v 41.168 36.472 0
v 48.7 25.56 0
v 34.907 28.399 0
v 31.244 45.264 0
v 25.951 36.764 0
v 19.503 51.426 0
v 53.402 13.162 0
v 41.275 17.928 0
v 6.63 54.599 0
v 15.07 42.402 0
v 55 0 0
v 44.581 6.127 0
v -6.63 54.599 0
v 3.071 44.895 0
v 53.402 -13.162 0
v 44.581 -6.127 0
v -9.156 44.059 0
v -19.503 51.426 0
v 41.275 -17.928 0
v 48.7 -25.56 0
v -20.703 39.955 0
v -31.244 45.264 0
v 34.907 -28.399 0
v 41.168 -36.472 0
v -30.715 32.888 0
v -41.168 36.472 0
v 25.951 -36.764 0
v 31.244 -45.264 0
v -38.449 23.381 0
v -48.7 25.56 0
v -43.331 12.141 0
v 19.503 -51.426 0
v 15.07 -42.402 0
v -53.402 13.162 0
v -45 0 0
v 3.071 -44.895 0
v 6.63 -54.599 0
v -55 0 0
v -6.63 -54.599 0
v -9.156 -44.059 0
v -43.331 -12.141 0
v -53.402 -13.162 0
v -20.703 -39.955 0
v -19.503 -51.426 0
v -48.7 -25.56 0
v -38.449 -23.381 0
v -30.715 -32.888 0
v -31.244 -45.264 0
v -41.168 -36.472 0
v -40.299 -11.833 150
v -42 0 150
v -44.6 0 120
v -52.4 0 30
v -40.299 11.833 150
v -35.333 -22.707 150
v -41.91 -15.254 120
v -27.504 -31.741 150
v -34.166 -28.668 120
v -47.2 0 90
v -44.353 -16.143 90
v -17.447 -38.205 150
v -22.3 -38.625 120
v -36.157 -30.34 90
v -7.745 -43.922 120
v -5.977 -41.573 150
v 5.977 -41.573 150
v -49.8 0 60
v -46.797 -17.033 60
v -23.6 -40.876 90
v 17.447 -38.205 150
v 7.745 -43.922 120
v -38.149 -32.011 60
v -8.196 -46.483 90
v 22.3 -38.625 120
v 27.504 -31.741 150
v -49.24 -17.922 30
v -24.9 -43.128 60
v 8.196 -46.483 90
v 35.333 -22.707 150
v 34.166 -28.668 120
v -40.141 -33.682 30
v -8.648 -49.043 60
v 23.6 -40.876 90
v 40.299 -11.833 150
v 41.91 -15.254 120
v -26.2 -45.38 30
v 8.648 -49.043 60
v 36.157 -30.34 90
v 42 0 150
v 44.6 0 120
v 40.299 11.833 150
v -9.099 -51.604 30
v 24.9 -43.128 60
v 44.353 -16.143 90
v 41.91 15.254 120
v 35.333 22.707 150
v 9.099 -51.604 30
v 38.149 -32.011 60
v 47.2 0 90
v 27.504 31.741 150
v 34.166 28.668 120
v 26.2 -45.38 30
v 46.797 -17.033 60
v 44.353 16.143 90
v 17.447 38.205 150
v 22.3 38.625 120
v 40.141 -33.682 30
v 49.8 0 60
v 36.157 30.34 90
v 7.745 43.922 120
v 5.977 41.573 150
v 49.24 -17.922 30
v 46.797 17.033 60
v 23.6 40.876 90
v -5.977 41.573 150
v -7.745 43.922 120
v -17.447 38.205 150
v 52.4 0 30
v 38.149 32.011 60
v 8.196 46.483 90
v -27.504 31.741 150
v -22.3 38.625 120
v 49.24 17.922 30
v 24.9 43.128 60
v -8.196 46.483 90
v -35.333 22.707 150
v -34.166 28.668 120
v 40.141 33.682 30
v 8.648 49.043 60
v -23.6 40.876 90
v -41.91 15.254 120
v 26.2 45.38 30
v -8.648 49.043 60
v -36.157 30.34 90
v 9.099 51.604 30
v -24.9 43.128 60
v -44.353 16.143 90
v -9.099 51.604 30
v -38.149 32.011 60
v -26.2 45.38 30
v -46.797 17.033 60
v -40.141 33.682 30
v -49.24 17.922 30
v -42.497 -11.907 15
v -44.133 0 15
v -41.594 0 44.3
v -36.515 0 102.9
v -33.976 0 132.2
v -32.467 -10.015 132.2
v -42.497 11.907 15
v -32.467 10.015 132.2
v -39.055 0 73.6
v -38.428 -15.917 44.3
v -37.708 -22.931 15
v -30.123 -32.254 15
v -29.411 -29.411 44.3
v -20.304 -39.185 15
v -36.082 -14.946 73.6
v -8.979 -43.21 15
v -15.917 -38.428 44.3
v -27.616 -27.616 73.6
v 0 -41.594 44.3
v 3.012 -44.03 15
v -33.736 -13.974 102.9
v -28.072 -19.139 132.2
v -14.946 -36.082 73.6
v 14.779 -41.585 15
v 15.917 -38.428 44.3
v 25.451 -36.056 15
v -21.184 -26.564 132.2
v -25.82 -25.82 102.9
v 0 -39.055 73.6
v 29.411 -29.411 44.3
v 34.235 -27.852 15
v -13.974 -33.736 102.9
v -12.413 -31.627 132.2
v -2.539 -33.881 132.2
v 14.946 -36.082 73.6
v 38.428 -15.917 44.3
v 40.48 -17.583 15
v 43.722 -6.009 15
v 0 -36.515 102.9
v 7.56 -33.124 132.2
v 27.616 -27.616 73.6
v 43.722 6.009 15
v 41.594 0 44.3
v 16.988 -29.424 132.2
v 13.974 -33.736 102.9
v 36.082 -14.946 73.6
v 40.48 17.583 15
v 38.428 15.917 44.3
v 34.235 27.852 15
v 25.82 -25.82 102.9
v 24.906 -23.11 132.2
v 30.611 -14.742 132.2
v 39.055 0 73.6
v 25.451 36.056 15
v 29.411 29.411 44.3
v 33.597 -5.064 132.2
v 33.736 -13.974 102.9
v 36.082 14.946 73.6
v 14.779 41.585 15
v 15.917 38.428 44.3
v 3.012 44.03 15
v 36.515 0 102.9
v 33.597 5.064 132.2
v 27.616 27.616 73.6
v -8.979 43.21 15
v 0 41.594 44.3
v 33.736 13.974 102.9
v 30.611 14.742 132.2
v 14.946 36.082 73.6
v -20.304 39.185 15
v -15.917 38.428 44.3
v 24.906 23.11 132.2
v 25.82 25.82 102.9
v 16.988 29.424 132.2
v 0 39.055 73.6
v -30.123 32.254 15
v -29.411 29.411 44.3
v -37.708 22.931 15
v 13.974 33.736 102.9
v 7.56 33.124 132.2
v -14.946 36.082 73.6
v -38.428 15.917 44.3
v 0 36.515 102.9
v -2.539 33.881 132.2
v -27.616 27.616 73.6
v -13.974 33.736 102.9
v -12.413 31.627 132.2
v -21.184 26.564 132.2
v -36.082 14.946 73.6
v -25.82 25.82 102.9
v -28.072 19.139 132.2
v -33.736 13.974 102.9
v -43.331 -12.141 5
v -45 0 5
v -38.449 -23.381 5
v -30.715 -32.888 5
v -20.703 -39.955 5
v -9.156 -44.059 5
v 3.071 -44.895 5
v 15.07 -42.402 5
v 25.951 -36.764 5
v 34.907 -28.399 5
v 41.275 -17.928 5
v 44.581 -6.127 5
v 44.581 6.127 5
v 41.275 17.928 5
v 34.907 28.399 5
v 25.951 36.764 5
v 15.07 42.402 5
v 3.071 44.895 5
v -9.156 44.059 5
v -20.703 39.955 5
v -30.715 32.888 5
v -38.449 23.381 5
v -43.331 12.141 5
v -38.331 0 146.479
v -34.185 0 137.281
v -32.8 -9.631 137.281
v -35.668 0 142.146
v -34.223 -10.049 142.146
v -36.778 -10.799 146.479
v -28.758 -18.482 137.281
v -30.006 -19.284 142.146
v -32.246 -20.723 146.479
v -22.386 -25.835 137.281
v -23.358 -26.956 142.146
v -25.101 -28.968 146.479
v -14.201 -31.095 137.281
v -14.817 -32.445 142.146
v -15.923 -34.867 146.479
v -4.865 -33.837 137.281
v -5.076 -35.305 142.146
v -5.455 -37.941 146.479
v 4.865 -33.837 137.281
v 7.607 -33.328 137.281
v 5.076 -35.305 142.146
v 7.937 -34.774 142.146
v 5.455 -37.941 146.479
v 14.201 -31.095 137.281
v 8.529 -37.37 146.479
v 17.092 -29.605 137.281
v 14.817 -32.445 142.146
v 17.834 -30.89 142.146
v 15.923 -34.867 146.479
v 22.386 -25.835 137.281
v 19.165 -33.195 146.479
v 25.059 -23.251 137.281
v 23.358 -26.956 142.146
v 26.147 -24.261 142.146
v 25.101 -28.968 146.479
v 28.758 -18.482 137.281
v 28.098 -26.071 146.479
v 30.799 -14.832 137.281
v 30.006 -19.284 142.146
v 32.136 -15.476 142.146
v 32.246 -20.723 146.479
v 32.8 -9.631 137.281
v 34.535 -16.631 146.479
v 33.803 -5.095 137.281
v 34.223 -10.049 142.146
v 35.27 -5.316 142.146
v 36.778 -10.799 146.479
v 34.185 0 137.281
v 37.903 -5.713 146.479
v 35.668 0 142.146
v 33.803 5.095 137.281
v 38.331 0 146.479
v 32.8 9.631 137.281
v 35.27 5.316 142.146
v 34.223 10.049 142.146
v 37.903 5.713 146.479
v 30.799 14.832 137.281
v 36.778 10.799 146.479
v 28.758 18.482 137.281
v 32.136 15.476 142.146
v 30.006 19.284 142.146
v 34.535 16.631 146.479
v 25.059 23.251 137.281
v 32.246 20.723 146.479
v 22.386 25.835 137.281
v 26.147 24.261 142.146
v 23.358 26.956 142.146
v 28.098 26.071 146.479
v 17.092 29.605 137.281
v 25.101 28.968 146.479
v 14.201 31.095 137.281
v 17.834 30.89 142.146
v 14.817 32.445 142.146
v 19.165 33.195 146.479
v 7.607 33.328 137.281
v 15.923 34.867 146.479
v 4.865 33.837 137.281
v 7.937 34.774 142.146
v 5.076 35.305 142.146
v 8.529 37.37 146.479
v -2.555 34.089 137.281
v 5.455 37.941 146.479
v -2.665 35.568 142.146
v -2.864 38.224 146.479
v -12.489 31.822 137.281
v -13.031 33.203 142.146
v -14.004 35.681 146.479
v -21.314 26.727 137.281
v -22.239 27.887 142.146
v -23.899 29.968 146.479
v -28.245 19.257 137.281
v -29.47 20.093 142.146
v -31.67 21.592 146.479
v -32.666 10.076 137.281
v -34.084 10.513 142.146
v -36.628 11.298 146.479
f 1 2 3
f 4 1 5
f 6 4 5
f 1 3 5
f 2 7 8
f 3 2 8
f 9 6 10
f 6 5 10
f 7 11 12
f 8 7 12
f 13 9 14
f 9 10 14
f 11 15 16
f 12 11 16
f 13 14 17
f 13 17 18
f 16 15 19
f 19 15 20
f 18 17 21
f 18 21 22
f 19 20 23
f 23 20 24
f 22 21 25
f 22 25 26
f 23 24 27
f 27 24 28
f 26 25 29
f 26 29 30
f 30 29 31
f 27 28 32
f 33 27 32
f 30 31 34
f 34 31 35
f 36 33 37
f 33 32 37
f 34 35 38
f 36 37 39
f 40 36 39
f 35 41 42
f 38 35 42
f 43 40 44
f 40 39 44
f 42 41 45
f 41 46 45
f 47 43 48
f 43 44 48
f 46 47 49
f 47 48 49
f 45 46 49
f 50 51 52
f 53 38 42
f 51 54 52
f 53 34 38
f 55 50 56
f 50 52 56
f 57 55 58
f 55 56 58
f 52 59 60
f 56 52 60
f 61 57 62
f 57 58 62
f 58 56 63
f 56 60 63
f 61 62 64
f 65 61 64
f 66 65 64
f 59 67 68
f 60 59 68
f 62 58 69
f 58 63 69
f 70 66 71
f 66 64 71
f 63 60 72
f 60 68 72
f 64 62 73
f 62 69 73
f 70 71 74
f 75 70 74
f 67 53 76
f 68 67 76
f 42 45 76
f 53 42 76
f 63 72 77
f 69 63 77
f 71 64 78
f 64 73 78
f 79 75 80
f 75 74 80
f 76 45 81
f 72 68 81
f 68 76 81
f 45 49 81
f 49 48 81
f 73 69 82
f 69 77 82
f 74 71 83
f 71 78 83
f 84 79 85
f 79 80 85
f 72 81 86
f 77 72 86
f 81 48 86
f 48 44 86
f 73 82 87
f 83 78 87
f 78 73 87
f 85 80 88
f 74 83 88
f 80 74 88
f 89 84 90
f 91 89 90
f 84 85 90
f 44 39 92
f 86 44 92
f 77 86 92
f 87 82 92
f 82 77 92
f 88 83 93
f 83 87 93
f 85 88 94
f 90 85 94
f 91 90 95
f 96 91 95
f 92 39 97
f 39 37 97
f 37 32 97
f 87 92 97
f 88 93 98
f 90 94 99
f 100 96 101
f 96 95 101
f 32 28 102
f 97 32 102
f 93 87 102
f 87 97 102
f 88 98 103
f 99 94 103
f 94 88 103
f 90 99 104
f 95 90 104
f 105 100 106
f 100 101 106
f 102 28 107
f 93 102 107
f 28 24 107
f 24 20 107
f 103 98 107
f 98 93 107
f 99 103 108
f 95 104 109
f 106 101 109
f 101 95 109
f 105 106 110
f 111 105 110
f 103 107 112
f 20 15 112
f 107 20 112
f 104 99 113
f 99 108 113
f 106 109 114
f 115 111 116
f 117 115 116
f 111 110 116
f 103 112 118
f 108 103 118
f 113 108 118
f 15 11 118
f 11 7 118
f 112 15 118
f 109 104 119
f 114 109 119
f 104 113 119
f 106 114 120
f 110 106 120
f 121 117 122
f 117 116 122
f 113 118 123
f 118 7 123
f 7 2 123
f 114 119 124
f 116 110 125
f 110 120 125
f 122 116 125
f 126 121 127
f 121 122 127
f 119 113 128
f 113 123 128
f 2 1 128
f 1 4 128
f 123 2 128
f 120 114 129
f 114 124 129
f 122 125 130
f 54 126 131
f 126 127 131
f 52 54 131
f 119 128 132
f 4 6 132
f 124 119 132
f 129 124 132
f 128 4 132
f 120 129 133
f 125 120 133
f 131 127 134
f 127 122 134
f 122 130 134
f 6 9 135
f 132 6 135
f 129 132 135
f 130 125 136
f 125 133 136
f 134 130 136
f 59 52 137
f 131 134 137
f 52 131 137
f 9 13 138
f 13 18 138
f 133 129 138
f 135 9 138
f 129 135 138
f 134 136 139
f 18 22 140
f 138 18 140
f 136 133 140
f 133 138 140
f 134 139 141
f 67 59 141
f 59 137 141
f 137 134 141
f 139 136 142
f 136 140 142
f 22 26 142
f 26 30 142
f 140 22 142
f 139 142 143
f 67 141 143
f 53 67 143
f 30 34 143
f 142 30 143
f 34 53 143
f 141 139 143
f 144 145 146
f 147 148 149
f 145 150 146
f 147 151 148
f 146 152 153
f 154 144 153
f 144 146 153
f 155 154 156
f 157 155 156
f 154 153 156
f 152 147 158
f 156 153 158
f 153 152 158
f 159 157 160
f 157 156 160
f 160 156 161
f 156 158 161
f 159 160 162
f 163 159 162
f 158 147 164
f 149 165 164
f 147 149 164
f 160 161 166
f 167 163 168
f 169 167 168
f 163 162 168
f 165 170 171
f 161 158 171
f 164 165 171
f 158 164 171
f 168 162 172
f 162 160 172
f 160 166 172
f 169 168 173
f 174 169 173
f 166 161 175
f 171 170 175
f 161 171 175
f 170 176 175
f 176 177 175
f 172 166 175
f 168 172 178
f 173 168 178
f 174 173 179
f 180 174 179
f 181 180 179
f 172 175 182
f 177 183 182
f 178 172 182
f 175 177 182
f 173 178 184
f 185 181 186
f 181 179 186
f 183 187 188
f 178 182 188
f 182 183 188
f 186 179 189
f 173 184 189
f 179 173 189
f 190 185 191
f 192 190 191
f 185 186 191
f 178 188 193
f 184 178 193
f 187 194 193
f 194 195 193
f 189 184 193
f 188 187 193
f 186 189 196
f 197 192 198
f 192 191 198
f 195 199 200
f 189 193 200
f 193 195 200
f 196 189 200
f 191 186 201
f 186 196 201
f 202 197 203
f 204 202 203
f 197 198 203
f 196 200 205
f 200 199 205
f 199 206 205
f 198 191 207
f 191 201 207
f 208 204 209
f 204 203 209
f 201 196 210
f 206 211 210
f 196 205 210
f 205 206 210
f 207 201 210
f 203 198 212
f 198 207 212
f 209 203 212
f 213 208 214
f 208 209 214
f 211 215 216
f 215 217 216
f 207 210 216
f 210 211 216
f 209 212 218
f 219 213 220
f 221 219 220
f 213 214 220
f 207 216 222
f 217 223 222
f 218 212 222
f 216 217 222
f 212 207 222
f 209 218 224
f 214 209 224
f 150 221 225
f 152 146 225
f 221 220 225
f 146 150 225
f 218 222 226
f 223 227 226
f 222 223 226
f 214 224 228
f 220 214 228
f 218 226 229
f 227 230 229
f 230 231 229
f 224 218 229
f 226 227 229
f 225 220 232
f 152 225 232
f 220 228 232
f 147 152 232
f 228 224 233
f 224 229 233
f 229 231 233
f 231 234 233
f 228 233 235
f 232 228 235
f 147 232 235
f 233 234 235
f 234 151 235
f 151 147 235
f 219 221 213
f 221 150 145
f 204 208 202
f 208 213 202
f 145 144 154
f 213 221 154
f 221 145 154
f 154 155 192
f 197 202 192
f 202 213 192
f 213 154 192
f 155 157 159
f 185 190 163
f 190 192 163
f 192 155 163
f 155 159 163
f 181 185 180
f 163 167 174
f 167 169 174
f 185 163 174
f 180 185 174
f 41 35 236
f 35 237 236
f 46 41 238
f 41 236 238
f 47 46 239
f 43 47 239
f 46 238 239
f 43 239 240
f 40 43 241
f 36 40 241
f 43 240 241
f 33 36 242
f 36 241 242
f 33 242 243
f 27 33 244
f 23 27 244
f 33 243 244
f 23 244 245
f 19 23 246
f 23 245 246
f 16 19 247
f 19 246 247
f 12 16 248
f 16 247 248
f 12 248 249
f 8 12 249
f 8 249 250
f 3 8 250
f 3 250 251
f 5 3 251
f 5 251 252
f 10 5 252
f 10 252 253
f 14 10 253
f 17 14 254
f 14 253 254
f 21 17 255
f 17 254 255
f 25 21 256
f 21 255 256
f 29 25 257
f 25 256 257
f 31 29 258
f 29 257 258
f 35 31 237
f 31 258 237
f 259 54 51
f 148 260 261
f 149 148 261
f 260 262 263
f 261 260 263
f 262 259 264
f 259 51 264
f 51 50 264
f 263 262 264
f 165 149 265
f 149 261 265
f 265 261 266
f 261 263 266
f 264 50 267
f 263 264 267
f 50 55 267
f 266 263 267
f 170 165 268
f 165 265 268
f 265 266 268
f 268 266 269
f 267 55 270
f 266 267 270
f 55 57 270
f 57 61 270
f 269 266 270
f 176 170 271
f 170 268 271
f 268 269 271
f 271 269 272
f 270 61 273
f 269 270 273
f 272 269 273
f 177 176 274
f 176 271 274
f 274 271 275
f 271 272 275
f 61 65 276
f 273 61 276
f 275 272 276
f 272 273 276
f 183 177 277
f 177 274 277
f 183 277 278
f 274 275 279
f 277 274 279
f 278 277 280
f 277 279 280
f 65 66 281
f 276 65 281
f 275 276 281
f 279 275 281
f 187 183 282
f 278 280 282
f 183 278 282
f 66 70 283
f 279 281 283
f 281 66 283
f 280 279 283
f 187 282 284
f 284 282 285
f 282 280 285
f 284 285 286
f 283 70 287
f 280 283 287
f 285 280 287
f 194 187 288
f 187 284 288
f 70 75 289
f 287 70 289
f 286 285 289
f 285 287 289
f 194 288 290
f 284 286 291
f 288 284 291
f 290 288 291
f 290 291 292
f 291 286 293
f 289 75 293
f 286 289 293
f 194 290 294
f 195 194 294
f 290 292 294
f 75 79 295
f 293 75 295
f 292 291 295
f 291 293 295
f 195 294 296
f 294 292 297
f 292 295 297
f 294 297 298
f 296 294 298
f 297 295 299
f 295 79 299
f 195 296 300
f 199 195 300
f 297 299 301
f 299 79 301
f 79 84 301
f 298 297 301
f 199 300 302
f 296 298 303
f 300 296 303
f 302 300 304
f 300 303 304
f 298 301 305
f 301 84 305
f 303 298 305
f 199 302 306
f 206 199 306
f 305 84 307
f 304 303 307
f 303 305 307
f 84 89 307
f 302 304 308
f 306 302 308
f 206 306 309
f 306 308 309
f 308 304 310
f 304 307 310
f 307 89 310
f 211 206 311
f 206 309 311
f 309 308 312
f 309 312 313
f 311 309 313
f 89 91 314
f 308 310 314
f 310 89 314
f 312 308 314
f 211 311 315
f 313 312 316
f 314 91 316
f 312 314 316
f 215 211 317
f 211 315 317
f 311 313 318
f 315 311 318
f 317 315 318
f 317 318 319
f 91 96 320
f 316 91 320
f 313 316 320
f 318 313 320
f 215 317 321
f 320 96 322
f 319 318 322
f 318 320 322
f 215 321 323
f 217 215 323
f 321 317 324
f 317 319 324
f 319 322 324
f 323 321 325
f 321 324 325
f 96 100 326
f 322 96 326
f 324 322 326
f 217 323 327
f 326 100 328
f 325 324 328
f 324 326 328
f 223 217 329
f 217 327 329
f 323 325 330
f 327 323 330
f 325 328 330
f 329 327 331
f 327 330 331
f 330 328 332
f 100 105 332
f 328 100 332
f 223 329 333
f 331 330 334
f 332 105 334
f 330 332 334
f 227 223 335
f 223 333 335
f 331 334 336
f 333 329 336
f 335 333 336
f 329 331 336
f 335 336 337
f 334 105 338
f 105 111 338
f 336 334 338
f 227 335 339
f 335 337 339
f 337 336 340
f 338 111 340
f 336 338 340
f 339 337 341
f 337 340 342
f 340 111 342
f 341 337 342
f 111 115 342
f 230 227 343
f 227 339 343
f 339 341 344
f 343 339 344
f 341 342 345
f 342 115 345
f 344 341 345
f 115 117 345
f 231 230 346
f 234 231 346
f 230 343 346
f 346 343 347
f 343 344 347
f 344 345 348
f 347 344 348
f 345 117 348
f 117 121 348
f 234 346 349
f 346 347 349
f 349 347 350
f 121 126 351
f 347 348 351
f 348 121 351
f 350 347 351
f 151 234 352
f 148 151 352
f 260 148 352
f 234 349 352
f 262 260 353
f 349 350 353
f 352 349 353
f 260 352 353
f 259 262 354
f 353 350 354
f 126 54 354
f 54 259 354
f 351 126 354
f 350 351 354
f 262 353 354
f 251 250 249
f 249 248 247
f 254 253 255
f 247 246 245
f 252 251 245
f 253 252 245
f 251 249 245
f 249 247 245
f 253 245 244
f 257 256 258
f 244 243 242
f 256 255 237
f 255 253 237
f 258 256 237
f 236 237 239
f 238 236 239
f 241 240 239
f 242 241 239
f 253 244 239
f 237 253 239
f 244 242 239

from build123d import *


# Not quite as in the source:
# - a fillet or chamfer that OpenCascade refuses, or shapes differently, is made with other operations: its cross-section is extruded or revolved along the edge and cut away or added


with BuildPart() as f1:
    # F0 (on Front) → F1 (revolve)
    with BuildSketch(Plane.XZ):
        Polygon((-45, 0), (-45, 5), (-44.1333333333, 15), (-32.417820976, 150.1789887381), (-42, 150), (-55, 0), align=None)
        Polygon((-45, 5), (0, 5), (0, 15), (-44.1333333333, 15), align=None)
    revolve(axis=Axis((0, 0, 75), (0, 0, 1)))

    # F2: fillet of radius 20 on 1 edges, made by hand

    # F2_s1 → F2_t2 (revolve, cut)
    with BuildSketch(Plane.XZ):
        with BuildLine():
            ThreePointArc((-33.9760329601, 132.1996196909), (-35.6682042477, 142.1455232835), (-42, 150))
            Line((-42, 150), (-32.417820976, 150.1789887381))
            Line((-32.417820976, 150.1789887381), (-33.9760329601, 132.1996196909))
        make_face()
    revolve(axis=Axis((0, 0, 150.1789887381), (0, 0, 1)), mode=Mode.SUBTRACT)


solid = f1.part
